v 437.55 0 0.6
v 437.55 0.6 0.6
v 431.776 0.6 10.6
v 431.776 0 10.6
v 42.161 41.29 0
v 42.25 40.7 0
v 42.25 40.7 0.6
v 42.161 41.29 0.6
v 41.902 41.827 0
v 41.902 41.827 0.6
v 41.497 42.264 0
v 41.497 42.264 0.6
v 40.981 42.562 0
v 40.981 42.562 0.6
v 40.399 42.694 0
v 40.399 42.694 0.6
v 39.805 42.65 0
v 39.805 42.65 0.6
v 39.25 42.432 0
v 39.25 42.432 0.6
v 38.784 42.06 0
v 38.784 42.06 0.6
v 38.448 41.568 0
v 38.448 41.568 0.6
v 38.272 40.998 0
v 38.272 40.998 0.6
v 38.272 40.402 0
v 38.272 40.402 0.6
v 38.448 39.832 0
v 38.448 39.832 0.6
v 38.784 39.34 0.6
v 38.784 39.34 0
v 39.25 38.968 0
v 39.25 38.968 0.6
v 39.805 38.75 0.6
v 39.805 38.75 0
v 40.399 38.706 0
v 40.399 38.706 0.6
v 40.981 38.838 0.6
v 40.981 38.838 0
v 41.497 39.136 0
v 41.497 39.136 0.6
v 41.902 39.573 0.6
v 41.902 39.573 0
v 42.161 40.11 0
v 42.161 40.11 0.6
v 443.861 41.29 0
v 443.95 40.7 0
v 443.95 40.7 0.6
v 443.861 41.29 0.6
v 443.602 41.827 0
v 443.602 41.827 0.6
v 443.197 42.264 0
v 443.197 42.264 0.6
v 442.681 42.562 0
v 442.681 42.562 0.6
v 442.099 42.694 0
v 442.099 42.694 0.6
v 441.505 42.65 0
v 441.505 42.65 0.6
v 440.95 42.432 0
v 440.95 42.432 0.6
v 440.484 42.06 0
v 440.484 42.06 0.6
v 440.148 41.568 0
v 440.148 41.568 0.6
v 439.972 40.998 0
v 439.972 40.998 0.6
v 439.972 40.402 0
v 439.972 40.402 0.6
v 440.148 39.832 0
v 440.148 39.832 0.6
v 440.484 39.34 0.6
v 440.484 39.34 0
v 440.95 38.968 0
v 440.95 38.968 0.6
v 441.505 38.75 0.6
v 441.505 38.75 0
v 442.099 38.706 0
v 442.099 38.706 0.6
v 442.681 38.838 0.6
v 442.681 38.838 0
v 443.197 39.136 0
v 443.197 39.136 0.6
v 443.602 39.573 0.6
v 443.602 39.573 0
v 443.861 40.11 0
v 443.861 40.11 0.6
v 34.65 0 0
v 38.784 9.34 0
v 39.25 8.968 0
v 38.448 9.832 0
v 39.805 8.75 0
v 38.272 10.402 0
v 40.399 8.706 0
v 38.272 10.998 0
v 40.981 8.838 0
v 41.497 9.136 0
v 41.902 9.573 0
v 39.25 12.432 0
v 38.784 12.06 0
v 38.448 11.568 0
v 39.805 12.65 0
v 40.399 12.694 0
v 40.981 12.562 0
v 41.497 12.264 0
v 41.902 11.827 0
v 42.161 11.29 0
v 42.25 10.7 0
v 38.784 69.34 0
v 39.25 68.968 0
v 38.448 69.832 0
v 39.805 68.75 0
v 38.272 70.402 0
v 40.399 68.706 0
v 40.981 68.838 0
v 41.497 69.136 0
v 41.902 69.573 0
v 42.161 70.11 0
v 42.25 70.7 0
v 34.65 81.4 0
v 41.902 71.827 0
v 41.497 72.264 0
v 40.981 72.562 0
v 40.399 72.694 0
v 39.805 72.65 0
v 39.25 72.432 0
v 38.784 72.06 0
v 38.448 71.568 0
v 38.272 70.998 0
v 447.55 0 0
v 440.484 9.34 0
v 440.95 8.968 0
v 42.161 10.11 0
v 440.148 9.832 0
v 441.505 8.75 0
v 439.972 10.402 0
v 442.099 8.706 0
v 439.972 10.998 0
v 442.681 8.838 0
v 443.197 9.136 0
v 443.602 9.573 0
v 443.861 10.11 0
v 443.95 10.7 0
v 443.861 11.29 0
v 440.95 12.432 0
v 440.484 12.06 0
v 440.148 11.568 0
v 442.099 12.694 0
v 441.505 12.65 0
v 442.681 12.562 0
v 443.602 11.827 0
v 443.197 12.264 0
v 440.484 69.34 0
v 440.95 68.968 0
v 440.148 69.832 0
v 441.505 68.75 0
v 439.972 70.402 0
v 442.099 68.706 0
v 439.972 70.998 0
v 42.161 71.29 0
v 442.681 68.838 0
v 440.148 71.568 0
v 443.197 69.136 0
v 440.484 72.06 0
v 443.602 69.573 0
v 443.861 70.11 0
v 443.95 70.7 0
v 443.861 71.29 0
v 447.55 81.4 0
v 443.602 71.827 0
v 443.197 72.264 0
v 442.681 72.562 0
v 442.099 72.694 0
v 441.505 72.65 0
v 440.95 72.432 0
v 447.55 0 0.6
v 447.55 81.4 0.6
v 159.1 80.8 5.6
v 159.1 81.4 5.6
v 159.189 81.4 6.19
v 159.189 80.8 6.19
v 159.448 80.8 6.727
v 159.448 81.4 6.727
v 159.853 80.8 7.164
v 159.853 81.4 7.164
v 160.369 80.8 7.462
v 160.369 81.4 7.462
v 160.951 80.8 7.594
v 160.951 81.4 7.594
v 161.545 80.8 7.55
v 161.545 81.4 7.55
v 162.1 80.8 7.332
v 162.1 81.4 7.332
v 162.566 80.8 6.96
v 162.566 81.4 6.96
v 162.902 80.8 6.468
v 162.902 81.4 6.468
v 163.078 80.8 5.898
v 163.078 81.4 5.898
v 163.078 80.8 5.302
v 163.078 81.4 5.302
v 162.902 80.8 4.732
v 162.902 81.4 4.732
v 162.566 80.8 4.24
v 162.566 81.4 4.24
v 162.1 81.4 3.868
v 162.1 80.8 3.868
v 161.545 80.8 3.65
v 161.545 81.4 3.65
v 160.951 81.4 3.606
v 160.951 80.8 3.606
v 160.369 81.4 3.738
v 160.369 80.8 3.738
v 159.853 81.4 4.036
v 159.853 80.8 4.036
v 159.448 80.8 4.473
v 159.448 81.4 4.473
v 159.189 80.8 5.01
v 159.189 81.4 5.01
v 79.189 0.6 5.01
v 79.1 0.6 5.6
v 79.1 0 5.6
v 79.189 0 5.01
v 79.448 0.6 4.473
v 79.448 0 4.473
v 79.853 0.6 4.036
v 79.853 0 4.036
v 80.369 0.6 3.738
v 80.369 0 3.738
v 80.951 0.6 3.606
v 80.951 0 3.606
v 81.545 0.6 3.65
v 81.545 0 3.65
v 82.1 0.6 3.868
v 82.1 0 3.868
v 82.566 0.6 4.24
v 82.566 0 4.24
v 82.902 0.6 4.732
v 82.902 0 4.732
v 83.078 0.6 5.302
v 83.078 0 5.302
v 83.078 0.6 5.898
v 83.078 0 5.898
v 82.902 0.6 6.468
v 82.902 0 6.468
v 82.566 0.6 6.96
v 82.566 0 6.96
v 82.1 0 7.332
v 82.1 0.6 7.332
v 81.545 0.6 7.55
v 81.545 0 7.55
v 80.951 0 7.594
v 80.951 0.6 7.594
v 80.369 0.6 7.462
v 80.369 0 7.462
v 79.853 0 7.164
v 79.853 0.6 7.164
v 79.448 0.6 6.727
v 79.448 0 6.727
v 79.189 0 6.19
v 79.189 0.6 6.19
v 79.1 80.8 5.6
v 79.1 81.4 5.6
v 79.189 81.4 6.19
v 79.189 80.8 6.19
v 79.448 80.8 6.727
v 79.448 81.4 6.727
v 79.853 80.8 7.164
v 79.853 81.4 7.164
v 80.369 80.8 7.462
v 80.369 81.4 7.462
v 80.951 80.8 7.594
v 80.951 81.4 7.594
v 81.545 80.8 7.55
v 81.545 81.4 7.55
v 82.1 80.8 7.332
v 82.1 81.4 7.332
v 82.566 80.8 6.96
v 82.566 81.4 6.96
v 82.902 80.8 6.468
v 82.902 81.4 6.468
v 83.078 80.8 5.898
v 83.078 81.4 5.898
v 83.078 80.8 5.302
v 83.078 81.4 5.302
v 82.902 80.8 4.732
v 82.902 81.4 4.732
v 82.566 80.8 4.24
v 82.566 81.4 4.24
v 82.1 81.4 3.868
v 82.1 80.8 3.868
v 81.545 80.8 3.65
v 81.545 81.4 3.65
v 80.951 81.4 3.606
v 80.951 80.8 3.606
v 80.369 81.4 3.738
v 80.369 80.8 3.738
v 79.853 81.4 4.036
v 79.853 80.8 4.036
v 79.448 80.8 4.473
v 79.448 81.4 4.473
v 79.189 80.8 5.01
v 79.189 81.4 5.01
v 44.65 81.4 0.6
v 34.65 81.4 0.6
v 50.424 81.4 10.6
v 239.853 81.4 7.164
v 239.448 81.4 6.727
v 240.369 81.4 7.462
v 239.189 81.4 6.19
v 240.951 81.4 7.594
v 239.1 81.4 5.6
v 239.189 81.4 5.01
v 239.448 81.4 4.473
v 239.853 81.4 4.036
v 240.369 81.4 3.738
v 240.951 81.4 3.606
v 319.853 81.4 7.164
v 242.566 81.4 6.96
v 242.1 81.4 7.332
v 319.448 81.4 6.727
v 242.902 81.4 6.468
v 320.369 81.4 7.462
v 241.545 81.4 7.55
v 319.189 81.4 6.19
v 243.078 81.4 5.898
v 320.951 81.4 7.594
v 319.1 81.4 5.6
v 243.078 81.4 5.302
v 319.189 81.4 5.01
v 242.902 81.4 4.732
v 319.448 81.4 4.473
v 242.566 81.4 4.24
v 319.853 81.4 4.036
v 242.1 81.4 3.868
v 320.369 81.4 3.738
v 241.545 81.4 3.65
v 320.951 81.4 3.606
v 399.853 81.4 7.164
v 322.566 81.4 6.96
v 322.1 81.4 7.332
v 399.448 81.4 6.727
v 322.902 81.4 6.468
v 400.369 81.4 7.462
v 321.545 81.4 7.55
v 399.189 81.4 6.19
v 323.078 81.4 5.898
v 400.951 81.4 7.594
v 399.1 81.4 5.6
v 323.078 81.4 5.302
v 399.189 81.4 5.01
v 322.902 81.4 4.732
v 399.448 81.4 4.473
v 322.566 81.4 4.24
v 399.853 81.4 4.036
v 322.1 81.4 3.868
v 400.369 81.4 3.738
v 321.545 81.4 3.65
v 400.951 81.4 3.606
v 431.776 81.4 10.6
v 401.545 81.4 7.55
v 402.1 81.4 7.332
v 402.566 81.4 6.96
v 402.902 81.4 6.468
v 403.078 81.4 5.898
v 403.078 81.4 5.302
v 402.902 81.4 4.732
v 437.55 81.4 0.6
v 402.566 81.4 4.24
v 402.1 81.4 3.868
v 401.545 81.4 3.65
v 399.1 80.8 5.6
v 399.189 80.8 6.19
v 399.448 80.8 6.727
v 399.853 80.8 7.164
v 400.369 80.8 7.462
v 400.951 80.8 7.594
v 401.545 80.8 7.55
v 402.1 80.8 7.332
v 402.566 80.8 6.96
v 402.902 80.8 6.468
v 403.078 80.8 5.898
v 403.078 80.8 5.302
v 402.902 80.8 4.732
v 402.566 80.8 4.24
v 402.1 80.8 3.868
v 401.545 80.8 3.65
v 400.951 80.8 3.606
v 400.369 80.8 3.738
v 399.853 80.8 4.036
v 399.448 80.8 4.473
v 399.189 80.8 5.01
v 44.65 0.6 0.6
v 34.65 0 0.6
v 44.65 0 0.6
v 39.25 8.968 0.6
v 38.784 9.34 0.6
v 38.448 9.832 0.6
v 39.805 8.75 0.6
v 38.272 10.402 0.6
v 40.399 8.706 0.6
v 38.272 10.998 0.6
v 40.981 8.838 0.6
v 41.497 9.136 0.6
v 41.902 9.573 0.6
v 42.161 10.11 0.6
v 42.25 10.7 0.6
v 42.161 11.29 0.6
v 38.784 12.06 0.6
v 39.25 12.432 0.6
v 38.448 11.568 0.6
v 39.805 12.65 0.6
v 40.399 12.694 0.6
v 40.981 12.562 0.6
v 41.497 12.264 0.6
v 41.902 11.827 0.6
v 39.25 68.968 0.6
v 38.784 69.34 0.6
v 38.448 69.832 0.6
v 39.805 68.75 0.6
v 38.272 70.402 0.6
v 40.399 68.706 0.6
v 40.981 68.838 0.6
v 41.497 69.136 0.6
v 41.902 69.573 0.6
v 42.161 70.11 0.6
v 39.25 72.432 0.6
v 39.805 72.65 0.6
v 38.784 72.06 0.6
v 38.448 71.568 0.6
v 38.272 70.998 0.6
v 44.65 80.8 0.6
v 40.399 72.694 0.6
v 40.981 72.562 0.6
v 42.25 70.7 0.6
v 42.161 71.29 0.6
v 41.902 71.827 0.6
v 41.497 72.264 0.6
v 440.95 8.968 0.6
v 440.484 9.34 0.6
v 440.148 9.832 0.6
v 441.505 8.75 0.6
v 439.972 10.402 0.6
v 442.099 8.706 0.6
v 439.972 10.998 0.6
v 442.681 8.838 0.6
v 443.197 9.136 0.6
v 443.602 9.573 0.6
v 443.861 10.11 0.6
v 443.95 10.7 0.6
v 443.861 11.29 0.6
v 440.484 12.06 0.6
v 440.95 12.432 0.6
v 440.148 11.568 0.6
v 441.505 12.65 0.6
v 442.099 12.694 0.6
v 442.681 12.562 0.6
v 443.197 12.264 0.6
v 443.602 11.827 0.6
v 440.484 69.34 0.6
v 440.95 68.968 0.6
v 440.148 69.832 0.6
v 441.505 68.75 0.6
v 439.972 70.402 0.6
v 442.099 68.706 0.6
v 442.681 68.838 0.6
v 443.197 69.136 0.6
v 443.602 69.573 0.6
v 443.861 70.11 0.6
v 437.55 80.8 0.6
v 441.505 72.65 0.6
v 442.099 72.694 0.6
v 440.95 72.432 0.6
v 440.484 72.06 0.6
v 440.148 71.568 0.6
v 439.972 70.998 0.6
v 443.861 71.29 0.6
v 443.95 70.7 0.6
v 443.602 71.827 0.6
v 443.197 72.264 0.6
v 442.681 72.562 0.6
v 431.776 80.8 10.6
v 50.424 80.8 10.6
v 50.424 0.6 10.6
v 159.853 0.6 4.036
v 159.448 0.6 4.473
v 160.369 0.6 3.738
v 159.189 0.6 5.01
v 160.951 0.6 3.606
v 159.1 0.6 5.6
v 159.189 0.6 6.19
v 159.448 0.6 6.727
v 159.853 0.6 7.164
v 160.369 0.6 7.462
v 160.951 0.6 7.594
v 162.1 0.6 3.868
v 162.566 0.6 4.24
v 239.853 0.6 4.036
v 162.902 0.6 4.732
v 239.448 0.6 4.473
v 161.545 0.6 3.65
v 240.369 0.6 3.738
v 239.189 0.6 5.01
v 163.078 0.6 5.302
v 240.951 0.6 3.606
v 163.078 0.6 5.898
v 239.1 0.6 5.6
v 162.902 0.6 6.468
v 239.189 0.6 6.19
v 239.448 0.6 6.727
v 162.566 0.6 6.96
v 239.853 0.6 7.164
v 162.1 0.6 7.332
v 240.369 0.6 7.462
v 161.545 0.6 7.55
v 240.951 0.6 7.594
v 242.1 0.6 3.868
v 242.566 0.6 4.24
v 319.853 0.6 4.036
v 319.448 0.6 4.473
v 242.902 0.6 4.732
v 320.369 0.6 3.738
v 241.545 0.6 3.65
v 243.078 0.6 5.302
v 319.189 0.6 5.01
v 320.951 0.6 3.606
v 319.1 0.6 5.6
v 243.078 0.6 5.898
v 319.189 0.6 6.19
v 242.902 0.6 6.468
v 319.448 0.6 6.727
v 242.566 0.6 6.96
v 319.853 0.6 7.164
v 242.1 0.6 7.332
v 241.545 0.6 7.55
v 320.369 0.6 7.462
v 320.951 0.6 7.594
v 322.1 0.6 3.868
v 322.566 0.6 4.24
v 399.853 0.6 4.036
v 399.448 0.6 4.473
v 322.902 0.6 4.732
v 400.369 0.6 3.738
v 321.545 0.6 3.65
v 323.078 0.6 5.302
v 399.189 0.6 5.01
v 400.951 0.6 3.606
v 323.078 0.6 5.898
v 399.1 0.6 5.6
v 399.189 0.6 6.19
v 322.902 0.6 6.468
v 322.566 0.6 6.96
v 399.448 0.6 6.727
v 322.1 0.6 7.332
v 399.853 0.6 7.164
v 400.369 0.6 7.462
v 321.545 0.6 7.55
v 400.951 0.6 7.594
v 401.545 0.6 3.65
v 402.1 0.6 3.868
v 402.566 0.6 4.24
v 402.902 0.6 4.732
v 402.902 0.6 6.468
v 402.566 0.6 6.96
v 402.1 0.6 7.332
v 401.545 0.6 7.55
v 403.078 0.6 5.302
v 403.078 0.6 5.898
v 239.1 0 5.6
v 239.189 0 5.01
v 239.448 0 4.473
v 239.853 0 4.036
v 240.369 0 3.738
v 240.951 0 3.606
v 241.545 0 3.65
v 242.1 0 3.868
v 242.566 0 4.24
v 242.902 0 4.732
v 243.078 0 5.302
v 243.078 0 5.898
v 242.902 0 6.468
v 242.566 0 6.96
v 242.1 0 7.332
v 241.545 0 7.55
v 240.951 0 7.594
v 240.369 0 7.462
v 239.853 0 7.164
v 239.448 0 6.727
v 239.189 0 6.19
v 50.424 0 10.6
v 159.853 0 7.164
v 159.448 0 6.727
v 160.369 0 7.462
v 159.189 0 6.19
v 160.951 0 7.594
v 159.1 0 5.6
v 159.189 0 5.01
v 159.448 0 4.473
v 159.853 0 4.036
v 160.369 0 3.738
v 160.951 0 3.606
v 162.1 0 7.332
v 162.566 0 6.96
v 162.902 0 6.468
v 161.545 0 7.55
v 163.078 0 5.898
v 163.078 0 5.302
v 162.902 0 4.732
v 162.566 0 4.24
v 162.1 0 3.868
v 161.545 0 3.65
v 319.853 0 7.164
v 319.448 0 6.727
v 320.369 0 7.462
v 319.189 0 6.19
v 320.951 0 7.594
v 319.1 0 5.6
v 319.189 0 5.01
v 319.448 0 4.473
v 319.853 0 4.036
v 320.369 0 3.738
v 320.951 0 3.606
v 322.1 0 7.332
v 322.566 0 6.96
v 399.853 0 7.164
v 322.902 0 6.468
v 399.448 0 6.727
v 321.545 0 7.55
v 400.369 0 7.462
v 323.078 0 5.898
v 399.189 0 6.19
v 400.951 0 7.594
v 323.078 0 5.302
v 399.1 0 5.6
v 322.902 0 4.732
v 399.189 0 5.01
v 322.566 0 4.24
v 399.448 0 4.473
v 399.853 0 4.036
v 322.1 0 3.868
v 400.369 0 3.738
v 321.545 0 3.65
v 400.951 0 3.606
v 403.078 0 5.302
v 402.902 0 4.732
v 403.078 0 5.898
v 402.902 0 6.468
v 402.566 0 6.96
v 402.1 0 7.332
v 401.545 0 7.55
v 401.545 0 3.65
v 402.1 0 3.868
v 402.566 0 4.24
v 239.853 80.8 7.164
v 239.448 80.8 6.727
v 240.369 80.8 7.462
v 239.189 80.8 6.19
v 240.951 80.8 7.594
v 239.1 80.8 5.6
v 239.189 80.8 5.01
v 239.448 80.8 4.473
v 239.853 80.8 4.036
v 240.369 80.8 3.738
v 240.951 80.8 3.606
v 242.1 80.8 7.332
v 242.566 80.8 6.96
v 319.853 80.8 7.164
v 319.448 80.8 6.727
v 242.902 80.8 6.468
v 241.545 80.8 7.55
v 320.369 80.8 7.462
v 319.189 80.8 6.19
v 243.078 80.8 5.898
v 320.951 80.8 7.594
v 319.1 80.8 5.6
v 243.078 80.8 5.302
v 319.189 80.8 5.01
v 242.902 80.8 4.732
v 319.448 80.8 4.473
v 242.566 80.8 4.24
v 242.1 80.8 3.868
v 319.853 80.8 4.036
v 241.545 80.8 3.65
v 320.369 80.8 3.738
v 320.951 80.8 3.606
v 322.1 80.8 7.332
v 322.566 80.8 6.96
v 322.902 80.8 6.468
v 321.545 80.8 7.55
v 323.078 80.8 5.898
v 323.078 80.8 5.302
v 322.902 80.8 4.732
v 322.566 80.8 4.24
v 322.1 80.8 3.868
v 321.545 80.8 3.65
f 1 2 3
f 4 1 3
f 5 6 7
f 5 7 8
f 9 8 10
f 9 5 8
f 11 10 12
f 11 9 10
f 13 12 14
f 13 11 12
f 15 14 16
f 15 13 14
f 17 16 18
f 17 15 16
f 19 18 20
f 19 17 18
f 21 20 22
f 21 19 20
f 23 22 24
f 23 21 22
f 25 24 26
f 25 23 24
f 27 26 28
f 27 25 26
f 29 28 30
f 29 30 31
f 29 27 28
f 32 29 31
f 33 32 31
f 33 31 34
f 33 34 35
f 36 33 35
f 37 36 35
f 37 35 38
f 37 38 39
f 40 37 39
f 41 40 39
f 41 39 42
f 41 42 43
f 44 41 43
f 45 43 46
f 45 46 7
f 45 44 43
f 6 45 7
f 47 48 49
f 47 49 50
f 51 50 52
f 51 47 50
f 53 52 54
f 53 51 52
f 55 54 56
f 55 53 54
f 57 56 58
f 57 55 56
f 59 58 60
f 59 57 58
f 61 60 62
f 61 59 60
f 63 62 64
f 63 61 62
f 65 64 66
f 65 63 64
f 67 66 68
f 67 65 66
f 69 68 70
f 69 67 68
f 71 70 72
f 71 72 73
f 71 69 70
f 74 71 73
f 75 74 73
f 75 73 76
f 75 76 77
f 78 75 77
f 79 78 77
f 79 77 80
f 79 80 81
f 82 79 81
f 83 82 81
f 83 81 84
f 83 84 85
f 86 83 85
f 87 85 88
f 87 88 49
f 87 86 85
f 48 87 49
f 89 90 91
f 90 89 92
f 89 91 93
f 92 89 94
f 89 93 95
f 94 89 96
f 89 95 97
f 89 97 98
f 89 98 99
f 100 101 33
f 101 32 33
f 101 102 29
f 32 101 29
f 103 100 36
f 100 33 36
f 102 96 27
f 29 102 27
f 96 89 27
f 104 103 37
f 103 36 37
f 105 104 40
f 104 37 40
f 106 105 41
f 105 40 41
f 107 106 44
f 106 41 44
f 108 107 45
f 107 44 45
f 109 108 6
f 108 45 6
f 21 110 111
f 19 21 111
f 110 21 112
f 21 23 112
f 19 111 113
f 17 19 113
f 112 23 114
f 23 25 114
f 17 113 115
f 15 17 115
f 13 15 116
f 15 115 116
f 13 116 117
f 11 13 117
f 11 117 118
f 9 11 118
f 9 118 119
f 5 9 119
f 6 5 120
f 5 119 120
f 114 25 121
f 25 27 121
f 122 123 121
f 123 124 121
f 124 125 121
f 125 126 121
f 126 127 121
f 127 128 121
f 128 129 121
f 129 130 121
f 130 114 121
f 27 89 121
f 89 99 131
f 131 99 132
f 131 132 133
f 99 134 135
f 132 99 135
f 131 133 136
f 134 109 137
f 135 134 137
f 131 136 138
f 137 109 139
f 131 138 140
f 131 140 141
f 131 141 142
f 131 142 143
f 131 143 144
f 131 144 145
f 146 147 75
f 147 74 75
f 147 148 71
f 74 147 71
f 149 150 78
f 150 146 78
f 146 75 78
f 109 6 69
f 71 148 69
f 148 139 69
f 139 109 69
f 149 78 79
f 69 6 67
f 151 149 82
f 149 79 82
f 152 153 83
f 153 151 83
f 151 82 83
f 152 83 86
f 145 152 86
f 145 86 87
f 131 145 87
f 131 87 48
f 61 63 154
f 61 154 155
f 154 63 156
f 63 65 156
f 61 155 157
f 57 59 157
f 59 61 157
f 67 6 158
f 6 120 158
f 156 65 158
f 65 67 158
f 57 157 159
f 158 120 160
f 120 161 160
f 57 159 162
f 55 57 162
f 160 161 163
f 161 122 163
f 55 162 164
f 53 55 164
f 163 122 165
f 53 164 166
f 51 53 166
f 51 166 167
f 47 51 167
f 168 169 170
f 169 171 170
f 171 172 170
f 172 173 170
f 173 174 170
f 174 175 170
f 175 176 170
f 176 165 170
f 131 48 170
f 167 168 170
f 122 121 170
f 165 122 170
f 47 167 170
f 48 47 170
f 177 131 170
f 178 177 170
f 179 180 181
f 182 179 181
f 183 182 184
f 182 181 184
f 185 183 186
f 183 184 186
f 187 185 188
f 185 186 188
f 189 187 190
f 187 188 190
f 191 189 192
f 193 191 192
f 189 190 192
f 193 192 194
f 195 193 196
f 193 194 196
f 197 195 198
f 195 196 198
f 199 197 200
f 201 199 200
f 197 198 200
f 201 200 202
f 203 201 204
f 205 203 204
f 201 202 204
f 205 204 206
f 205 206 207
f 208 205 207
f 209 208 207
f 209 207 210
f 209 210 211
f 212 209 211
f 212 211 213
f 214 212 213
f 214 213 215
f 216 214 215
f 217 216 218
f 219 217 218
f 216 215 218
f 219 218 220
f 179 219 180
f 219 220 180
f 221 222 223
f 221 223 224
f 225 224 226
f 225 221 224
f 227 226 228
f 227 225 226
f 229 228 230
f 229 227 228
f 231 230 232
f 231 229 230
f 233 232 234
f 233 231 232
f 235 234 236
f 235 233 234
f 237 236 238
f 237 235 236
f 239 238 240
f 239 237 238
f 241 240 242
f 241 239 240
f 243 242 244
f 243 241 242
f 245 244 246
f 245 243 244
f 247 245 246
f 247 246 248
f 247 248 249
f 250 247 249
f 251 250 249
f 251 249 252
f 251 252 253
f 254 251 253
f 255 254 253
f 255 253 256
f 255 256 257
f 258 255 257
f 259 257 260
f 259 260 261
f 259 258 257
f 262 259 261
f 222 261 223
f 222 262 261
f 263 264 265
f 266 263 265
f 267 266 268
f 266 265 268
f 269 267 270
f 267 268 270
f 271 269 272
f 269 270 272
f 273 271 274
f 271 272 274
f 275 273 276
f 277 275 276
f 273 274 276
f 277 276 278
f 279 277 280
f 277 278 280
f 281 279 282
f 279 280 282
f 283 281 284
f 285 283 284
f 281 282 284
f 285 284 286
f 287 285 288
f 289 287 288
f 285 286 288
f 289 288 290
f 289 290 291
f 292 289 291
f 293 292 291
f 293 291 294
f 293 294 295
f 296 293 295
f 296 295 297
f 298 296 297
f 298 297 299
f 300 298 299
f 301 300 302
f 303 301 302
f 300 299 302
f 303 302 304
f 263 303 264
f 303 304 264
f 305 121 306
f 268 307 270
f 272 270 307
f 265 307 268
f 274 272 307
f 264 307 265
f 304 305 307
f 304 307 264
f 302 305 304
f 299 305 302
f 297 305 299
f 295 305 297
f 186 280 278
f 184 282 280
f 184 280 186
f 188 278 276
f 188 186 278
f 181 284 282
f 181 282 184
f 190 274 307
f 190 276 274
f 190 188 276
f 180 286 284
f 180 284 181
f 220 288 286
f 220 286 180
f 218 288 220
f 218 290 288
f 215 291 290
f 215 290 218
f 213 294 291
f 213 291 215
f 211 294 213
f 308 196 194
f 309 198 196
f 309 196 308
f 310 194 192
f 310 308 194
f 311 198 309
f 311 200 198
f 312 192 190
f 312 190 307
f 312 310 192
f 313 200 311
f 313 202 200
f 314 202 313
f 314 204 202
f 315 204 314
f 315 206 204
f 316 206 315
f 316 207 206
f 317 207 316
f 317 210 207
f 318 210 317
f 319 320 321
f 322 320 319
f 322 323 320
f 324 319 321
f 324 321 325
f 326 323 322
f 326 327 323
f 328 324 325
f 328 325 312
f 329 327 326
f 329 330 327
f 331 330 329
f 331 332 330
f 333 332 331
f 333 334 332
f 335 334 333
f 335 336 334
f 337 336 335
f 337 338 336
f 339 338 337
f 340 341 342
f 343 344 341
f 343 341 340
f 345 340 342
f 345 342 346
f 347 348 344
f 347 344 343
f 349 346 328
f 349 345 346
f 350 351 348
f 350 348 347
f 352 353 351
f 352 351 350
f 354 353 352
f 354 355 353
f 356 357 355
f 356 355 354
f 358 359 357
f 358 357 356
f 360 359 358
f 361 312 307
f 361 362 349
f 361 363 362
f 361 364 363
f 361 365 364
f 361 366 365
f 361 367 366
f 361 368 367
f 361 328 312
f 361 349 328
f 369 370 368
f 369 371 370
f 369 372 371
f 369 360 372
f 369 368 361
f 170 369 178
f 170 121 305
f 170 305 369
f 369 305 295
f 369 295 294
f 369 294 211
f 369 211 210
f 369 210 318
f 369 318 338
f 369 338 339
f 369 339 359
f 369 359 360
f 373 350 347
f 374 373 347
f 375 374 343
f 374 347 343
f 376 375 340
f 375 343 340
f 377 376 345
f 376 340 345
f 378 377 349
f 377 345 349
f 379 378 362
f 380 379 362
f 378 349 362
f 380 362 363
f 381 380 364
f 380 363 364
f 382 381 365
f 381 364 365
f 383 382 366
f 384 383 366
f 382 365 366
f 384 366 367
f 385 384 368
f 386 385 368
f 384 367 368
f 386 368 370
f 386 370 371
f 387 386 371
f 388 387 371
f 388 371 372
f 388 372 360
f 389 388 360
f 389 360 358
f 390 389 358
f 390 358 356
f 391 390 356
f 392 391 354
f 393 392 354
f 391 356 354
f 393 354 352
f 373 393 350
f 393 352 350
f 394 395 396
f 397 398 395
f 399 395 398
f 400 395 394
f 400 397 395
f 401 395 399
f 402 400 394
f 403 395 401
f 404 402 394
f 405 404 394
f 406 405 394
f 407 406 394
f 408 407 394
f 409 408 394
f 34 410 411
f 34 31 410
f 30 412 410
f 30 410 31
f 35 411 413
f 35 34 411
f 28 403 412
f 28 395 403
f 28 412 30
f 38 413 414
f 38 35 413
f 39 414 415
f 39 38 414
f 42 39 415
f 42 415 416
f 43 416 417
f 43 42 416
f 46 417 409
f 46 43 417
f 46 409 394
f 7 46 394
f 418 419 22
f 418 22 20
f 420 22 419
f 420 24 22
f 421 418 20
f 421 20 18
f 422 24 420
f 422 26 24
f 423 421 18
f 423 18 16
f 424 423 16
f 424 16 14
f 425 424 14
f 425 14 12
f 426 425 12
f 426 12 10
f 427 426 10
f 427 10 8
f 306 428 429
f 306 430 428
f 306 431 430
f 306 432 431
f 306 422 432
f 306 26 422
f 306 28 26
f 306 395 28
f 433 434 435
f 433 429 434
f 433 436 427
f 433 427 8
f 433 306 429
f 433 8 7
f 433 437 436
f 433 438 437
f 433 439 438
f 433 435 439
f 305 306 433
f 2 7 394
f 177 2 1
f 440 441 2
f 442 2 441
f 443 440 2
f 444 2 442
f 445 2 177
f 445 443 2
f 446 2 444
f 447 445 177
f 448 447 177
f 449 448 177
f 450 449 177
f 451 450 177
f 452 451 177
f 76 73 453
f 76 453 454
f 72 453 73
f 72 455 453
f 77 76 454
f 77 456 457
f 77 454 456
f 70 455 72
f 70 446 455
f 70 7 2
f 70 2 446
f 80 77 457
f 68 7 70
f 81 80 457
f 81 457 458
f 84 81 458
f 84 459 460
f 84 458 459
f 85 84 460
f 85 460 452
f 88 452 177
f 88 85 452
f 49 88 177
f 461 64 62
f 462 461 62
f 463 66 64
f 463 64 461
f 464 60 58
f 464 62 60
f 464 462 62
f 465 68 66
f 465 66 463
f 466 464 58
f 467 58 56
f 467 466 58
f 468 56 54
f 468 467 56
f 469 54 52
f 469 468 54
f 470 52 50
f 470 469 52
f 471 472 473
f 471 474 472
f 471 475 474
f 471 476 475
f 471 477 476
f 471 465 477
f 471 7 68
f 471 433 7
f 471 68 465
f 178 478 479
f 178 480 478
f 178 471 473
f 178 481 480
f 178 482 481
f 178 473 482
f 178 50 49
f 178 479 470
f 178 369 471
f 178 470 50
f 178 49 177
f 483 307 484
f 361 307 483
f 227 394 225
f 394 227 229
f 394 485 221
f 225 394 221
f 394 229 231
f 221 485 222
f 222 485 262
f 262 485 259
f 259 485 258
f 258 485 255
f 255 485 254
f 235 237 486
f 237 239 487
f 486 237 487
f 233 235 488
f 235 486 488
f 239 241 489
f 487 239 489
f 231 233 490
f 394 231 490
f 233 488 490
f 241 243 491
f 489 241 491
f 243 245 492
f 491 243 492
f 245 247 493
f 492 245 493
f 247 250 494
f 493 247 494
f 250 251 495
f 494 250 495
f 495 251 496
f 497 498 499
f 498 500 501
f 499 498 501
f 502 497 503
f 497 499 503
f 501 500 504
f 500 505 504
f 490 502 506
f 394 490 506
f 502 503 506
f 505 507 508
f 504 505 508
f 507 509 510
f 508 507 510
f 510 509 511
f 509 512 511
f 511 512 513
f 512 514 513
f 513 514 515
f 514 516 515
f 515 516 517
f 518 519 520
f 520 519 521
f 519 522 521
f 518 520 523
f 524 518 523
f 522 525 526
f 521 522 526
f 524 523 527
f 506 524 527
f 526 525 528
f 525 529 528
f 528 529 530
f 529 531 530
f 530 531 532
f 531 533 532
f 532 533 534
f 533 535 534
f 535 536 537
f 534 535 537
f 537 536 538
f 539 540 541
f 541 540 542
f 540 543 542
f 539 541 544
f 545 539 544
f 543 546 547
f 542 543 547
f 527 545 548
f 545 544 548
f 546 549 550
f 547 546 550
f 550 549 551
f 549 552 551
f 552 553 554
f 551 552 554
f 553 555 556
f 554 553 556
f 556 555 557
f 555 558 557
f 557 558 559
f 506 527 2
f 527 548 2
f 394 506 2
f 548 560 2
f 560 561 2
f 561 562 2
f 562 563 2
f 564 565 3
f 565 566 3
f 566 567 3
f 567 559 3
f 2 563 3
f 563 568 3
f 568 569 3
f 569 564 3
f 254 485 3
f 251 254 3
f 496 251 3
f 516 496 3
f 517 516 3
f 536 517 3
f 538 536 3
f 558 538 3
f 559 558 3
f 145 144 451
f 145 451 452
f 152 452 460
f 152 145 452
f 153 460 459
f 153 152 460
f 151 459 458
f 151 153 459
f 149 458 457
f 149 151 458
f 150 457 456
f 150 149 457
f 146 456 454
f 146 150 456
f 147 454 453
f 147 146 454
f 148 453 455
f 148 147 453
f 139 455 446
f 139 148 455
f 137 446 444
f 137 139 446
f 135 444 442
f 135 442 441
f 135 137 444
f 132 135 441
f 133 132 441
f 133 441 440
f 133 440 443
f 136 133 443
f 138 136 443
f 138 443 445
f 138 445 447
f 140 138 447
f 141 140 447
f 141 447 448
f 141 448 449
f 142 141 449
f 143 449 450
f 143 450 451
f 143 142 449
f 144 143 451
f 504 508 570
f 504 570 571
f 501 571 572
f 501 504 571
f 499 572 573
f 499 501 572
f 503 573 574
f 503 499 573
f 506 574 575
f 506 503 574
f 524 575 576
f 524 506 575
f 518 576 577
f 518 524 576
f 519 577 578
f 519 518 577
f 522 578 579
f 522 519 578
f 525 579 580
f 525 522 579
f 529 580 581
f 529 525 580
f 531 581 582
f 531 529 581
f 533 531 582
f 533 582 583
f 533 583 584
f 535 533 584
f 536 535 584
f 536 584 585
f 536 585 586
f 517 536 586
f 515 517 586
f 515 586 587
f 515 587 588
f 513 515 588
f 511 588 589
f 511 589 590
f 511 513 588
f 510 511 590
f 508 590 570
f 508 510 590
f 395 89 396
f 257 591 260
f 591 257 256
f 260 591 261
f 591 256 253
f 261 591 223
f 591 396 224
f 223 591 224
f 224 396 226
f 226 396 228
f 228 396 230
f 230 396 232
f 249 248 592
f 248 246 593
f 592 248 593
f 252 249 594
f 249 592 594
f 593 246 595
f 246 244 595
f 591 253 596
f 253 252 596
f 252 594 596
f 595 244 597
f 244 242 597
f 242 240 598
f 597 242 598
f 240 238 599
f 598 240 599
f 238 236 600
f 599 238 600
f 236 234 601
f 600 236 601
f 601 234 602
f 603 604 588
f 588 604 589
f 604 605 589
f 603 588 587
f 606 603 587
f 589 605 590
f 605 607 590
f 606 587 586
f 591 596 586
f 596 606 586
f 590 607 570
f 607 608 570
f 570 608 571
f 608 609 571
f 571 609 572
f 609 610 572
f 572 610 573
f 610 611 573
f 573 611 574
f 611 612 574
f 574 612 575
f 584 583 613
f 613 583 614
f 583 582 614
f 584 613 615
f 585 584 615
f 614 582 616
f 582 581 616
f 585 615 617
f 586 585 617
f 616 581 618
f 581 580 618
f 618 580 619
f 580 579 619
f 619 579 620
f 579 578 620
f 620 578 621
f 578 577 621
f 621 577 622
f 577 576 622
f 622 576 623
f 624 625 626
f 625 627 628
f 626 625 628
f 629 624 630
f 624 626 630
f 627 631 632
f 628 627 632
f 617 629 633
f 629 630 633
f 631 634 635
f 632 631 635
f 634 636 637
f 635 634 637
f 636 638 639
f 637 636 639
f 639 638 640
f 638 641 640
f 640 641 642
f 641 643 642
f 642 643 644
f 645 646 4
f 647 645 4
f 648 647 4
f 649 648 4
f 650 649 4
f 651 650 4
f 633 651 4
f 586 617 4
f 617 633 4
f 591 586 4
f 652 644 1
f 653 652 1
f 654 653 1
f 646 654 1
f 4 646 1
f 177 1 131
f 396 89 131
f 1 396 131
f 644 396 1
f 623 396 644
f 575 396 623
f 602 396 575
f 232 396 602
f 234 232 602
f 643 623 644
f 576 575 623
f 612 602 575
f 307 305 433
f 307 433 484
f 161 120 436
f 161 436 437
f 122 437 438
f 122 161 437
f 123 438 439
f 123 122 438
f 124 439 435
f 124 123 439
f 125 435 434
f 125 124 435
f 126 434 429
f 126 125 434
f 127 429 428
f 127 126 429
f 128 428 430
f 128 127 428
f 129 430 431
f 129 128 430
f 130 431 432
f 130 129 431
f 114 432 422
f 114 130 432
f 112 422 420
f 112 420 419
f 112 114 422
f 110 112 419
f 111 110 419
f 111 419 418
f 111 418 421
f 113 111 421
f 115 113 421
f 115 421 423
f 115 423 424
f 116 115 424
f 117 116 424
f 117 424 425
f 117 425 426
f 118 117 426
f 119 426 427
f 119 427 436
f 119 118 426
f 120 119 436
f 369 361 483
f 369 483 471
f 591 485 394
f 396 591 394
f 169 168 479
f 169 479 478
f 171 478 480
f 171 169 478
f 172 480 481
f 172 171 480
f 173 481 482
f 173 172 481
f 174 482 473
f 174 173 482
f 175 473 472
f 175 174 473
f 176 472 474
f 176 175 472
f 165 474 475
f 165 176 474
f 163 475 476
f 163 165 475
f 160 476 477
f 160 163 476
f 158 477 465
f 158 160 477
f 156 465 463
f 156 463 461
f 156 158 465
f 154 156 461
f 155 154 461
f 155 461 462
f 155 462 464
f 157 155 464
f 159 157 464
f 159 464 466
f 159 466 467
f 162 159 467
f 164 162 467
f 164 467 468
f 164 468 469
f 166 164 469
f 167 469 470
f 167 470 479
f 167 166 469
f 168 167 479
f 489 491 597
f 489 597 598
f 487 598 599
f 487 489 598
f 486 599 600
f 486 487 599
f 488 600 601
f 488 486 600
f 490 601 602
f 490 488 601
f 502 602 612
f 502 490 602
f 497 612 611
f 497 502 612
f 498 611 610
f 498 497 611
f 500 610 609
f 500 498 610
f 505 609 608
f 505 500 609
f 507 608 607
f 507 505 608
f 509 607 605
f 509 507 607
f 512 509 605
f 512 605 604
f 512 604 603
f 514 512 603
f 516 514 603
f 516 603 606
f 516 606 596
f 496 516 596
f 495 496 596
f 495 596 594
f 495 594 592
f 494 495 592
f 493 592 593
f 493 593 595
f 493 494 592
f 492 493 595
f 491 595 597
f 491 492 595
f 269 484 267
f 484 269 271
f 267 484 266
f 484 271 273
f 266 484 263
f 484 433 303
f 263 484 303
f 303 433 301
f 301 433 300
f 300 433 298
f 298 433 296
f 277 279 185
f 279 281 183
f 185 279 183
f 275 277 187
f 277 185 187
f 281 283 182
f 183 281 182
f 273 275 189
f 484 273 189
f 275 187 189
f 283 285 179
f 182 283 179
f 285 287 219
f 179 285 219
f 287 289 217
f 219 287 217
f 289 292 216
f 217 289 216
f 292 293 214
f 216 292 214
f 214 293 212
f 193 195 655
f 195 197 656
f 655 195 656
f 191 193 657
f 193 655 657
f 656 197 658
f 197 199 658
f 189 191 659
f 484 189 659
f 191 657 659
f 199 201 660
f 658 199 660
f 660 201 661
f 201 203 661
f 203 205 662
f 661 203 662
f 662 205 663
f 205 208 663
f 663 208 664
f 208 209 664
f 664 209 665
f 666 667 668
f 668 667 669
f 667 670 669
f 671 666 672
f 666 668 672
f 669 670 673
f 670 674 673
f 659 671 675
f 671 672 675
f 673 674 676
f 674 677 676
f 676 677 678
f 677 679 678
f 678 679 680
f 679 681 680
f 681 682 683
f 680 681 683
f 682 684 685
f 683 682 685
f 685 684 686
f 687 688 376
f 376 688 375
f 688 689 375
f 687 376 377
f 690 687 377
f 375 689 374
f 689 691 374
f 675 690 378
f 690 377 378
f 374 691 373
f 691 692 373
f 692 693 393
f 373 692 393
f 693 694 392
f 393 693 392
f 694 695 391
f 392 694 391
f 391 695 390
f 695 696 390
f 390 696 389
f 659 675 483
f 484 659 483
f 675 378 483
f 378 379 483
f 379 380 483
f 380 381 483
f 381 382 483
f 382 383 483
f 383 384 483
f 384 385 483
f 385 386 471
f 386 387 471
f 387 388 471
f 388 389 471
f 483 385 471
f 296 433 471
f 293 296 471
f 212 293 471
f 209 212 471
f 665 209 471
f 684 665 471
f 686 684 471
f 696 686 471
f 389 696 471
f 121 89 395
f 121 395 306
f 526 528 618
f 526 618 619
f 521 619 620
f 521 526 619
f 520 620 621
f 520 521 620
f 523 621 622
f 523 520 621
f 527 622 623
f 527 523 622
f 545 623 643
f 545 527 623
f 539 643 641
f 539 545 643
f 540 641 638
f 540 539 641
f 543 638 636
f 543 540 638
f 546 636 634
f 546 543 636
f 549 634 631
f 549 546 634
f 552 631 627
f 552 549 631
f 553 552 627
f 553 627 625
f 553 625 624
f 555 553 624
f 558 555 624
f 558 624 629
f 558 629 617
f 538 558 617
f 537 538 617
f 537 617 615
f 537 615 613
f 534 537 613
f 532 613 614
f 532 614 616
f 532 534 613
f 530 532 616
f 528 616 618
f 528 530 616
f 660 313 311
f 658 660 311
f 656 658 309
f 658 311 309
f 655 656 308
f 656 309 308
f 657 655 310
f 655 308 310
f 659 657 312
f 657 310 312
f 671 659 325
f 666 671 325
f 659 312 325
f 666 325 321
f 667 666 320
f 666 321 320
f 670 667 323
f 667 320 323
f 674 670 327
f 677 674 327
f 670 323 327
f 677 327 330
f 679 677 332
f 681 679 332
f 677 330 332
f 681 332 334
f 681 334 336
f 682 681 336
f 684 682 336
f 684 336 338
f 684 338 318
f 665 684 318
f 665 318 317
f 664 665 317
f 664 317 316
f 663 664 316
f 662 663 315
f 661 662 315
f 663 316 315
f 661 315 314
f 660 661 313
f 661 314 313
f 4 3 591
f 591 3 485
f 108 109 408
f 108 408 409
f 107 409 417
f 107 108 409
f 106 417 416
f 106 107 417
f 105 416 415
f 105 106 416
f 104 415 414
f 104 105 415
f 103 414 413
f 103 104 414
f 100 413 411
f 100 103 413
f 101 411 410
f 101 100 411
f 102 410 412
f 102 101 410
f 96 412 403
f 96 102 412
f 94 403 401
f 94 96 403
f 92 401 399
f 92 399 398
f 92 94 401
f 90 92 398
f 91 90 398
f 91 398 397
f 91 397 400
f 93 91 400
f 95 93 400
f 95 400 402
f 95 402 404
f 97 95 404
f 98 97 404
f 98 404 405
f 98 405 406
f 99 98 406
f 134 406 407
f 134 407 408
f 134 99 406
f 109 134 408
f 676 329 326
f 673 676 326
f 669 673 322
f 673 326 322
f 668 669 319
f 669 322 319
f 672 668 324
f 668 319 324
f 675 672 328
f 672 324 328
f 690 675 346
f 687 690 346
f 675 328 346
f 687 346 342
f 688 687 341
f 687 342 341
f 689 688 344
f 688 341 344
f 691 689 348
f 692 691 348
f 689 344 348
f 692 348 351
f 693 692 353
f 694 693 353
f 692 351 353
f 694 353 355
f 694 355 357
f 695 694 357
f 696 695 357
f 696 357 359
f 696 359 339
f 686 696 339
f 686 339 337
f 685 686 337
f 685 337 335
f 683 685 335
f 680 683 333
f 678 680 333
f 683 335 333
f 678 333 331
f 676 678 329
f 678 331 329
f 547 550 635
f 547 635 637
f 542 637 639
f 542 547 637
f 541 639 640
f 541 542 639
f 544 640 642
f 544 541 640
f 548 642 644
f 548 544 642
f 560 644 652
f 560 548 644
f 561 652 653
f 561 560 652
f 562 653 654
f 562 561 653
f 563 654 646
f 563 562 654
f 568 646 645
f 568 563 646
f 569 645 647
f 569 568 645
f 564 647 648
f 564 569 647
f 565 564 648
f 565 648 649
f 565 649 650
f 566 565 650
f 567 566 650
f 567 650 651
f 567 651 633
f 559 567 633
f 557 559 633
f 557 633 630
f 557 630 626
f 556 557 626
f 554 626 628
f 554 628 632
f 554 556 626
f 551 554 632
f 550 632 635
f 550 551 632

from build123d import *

# Parameters (mm, degrees)
SKETCH_1_W      = 412.9
SKETCH_1_H      = 81.4
SKETCH_1_R      = 2
EXTRUDE_1_DEPTH = 0.6
SKETCH_2_R      = 2
EXTRUDE_2_DEPTH = 0.6
EXTRUDE_START   = -0.6
SKETCH_3_R      = 2
EXTRUDE_3_DEPTH = 0.6


with BuildPart() as part:
    # Эскиз1 → Бобышка-Вытянуть1 (new body)
    with BuildSketch(Plane.XY):
        with Locations((241.1, 40.7)):
            Rectangle(SKETCH_1_W, SKETCH_1_H)
        with Locations((40.25, 10.7)):
            Circle(SKETCH_1_R, mode=Mode.SUBTRACT)
        with Locations((441.95, 10.7)):
            Circle(SKETCH_1_R, mode=Mode.SUBTRACT)
        with Locations((40.25, 40.7)):
            Circle(SKETCH_1_R, mode=Mode.SUBTRACT)
        with Locations((40.25, 70.7)):
            Circle(SKETCH_1_R, mode=Mode.SUBTRACT)
        with Locations((441.95, 40.7)):
            Circle(SKETCH_1_R, mode=Mode.SUBTRACT)
        with Locations((441.95, 70.7)):
            Circle(SKETCH_1_R, mode=Mode.SUBTRACT)
    extrude(amount=EXTRUDE_1_DEPTH)

    # Эскиз2 → Бобышка-Вытянуть2 (add)
    with BuildSketch(Plane(origin=(0, 81.4, 0), x_dir=(1, 0, 0), z_dir=(0, 1, 0))):
        Polygon((44.65, -0.6), (50.423502692, -10.6), (431.776497308, -10.6), (437.55, -0.6), align=None)
        with Locations(Location((401.1, -5.6, 0), (0, 0, 180))):
            Circle(SKETCH_2_R, mode=Mode.SUBTRACT)
        with Locations(Location((321.1, -5.6, 0), (0, 0, 180))):
            Circle(SKETCH_2_R, mode=Mode.SUBTRACT)
        with Locations(Location((241.1, -5.6, 0), (0, 0, 180))):
            Circle(SKETCH_2_R, mode=Mode.SUBTRACT)
        with Locations(Location((161.1, -5.6, 0), (0, 0, 180))):
            Circle(SKETCH_2_R, mode=Mode.SUBTRACT)
        with Locations(Location((81.1, -5.6, 0), (0, 0, 180))):
            Circle(SKETCH_2_R, mode=Mode.SUBTRACT)
    extrude(amount=-EXTRUDE_2_DEPTH)

    # Эскиз3 → Бобышка-Вытянуть3 (add)
    with BuildSketch(Plane.XZ.offset(EXTRUDE_START)):
        Polygon((44.65, 0.6), (437.55, 0.6), (431.776497308, 10.6), (50.423502692, 10.6), align=None)
        with Locations(Location((401.1, 5.6, 0), (0, 0, 180))):
            Circle(SKETCH_3_R, mode=Mode.SUBTRACT)
        with Locations(Location((321.1, 5.6, 0), (0, 0, 180))):
            Circle(SKETCH_3_R, mode=Mode.SUBTRACT)
        with Locations(Location((241.1, 5.6, 0), (0, 0, 180))):
            Circle(SKETCH_3_R, mode=Mode.SUBTRACT)
        with Locations(Location((161.1, 5.6, 0), (0, 0, 180))):
            Circle(SKETCH_3_R, mode=Mode.SUBTRACT)
        with Locations(Location((81.1, 5.6, 0), (0, 0, 180))):
            Circle(SKETCH_3_R, mode=Mode.SUBTRACT)
    extrude(amount=EXTRUDE_3_DEPTH)


solid = part.part
